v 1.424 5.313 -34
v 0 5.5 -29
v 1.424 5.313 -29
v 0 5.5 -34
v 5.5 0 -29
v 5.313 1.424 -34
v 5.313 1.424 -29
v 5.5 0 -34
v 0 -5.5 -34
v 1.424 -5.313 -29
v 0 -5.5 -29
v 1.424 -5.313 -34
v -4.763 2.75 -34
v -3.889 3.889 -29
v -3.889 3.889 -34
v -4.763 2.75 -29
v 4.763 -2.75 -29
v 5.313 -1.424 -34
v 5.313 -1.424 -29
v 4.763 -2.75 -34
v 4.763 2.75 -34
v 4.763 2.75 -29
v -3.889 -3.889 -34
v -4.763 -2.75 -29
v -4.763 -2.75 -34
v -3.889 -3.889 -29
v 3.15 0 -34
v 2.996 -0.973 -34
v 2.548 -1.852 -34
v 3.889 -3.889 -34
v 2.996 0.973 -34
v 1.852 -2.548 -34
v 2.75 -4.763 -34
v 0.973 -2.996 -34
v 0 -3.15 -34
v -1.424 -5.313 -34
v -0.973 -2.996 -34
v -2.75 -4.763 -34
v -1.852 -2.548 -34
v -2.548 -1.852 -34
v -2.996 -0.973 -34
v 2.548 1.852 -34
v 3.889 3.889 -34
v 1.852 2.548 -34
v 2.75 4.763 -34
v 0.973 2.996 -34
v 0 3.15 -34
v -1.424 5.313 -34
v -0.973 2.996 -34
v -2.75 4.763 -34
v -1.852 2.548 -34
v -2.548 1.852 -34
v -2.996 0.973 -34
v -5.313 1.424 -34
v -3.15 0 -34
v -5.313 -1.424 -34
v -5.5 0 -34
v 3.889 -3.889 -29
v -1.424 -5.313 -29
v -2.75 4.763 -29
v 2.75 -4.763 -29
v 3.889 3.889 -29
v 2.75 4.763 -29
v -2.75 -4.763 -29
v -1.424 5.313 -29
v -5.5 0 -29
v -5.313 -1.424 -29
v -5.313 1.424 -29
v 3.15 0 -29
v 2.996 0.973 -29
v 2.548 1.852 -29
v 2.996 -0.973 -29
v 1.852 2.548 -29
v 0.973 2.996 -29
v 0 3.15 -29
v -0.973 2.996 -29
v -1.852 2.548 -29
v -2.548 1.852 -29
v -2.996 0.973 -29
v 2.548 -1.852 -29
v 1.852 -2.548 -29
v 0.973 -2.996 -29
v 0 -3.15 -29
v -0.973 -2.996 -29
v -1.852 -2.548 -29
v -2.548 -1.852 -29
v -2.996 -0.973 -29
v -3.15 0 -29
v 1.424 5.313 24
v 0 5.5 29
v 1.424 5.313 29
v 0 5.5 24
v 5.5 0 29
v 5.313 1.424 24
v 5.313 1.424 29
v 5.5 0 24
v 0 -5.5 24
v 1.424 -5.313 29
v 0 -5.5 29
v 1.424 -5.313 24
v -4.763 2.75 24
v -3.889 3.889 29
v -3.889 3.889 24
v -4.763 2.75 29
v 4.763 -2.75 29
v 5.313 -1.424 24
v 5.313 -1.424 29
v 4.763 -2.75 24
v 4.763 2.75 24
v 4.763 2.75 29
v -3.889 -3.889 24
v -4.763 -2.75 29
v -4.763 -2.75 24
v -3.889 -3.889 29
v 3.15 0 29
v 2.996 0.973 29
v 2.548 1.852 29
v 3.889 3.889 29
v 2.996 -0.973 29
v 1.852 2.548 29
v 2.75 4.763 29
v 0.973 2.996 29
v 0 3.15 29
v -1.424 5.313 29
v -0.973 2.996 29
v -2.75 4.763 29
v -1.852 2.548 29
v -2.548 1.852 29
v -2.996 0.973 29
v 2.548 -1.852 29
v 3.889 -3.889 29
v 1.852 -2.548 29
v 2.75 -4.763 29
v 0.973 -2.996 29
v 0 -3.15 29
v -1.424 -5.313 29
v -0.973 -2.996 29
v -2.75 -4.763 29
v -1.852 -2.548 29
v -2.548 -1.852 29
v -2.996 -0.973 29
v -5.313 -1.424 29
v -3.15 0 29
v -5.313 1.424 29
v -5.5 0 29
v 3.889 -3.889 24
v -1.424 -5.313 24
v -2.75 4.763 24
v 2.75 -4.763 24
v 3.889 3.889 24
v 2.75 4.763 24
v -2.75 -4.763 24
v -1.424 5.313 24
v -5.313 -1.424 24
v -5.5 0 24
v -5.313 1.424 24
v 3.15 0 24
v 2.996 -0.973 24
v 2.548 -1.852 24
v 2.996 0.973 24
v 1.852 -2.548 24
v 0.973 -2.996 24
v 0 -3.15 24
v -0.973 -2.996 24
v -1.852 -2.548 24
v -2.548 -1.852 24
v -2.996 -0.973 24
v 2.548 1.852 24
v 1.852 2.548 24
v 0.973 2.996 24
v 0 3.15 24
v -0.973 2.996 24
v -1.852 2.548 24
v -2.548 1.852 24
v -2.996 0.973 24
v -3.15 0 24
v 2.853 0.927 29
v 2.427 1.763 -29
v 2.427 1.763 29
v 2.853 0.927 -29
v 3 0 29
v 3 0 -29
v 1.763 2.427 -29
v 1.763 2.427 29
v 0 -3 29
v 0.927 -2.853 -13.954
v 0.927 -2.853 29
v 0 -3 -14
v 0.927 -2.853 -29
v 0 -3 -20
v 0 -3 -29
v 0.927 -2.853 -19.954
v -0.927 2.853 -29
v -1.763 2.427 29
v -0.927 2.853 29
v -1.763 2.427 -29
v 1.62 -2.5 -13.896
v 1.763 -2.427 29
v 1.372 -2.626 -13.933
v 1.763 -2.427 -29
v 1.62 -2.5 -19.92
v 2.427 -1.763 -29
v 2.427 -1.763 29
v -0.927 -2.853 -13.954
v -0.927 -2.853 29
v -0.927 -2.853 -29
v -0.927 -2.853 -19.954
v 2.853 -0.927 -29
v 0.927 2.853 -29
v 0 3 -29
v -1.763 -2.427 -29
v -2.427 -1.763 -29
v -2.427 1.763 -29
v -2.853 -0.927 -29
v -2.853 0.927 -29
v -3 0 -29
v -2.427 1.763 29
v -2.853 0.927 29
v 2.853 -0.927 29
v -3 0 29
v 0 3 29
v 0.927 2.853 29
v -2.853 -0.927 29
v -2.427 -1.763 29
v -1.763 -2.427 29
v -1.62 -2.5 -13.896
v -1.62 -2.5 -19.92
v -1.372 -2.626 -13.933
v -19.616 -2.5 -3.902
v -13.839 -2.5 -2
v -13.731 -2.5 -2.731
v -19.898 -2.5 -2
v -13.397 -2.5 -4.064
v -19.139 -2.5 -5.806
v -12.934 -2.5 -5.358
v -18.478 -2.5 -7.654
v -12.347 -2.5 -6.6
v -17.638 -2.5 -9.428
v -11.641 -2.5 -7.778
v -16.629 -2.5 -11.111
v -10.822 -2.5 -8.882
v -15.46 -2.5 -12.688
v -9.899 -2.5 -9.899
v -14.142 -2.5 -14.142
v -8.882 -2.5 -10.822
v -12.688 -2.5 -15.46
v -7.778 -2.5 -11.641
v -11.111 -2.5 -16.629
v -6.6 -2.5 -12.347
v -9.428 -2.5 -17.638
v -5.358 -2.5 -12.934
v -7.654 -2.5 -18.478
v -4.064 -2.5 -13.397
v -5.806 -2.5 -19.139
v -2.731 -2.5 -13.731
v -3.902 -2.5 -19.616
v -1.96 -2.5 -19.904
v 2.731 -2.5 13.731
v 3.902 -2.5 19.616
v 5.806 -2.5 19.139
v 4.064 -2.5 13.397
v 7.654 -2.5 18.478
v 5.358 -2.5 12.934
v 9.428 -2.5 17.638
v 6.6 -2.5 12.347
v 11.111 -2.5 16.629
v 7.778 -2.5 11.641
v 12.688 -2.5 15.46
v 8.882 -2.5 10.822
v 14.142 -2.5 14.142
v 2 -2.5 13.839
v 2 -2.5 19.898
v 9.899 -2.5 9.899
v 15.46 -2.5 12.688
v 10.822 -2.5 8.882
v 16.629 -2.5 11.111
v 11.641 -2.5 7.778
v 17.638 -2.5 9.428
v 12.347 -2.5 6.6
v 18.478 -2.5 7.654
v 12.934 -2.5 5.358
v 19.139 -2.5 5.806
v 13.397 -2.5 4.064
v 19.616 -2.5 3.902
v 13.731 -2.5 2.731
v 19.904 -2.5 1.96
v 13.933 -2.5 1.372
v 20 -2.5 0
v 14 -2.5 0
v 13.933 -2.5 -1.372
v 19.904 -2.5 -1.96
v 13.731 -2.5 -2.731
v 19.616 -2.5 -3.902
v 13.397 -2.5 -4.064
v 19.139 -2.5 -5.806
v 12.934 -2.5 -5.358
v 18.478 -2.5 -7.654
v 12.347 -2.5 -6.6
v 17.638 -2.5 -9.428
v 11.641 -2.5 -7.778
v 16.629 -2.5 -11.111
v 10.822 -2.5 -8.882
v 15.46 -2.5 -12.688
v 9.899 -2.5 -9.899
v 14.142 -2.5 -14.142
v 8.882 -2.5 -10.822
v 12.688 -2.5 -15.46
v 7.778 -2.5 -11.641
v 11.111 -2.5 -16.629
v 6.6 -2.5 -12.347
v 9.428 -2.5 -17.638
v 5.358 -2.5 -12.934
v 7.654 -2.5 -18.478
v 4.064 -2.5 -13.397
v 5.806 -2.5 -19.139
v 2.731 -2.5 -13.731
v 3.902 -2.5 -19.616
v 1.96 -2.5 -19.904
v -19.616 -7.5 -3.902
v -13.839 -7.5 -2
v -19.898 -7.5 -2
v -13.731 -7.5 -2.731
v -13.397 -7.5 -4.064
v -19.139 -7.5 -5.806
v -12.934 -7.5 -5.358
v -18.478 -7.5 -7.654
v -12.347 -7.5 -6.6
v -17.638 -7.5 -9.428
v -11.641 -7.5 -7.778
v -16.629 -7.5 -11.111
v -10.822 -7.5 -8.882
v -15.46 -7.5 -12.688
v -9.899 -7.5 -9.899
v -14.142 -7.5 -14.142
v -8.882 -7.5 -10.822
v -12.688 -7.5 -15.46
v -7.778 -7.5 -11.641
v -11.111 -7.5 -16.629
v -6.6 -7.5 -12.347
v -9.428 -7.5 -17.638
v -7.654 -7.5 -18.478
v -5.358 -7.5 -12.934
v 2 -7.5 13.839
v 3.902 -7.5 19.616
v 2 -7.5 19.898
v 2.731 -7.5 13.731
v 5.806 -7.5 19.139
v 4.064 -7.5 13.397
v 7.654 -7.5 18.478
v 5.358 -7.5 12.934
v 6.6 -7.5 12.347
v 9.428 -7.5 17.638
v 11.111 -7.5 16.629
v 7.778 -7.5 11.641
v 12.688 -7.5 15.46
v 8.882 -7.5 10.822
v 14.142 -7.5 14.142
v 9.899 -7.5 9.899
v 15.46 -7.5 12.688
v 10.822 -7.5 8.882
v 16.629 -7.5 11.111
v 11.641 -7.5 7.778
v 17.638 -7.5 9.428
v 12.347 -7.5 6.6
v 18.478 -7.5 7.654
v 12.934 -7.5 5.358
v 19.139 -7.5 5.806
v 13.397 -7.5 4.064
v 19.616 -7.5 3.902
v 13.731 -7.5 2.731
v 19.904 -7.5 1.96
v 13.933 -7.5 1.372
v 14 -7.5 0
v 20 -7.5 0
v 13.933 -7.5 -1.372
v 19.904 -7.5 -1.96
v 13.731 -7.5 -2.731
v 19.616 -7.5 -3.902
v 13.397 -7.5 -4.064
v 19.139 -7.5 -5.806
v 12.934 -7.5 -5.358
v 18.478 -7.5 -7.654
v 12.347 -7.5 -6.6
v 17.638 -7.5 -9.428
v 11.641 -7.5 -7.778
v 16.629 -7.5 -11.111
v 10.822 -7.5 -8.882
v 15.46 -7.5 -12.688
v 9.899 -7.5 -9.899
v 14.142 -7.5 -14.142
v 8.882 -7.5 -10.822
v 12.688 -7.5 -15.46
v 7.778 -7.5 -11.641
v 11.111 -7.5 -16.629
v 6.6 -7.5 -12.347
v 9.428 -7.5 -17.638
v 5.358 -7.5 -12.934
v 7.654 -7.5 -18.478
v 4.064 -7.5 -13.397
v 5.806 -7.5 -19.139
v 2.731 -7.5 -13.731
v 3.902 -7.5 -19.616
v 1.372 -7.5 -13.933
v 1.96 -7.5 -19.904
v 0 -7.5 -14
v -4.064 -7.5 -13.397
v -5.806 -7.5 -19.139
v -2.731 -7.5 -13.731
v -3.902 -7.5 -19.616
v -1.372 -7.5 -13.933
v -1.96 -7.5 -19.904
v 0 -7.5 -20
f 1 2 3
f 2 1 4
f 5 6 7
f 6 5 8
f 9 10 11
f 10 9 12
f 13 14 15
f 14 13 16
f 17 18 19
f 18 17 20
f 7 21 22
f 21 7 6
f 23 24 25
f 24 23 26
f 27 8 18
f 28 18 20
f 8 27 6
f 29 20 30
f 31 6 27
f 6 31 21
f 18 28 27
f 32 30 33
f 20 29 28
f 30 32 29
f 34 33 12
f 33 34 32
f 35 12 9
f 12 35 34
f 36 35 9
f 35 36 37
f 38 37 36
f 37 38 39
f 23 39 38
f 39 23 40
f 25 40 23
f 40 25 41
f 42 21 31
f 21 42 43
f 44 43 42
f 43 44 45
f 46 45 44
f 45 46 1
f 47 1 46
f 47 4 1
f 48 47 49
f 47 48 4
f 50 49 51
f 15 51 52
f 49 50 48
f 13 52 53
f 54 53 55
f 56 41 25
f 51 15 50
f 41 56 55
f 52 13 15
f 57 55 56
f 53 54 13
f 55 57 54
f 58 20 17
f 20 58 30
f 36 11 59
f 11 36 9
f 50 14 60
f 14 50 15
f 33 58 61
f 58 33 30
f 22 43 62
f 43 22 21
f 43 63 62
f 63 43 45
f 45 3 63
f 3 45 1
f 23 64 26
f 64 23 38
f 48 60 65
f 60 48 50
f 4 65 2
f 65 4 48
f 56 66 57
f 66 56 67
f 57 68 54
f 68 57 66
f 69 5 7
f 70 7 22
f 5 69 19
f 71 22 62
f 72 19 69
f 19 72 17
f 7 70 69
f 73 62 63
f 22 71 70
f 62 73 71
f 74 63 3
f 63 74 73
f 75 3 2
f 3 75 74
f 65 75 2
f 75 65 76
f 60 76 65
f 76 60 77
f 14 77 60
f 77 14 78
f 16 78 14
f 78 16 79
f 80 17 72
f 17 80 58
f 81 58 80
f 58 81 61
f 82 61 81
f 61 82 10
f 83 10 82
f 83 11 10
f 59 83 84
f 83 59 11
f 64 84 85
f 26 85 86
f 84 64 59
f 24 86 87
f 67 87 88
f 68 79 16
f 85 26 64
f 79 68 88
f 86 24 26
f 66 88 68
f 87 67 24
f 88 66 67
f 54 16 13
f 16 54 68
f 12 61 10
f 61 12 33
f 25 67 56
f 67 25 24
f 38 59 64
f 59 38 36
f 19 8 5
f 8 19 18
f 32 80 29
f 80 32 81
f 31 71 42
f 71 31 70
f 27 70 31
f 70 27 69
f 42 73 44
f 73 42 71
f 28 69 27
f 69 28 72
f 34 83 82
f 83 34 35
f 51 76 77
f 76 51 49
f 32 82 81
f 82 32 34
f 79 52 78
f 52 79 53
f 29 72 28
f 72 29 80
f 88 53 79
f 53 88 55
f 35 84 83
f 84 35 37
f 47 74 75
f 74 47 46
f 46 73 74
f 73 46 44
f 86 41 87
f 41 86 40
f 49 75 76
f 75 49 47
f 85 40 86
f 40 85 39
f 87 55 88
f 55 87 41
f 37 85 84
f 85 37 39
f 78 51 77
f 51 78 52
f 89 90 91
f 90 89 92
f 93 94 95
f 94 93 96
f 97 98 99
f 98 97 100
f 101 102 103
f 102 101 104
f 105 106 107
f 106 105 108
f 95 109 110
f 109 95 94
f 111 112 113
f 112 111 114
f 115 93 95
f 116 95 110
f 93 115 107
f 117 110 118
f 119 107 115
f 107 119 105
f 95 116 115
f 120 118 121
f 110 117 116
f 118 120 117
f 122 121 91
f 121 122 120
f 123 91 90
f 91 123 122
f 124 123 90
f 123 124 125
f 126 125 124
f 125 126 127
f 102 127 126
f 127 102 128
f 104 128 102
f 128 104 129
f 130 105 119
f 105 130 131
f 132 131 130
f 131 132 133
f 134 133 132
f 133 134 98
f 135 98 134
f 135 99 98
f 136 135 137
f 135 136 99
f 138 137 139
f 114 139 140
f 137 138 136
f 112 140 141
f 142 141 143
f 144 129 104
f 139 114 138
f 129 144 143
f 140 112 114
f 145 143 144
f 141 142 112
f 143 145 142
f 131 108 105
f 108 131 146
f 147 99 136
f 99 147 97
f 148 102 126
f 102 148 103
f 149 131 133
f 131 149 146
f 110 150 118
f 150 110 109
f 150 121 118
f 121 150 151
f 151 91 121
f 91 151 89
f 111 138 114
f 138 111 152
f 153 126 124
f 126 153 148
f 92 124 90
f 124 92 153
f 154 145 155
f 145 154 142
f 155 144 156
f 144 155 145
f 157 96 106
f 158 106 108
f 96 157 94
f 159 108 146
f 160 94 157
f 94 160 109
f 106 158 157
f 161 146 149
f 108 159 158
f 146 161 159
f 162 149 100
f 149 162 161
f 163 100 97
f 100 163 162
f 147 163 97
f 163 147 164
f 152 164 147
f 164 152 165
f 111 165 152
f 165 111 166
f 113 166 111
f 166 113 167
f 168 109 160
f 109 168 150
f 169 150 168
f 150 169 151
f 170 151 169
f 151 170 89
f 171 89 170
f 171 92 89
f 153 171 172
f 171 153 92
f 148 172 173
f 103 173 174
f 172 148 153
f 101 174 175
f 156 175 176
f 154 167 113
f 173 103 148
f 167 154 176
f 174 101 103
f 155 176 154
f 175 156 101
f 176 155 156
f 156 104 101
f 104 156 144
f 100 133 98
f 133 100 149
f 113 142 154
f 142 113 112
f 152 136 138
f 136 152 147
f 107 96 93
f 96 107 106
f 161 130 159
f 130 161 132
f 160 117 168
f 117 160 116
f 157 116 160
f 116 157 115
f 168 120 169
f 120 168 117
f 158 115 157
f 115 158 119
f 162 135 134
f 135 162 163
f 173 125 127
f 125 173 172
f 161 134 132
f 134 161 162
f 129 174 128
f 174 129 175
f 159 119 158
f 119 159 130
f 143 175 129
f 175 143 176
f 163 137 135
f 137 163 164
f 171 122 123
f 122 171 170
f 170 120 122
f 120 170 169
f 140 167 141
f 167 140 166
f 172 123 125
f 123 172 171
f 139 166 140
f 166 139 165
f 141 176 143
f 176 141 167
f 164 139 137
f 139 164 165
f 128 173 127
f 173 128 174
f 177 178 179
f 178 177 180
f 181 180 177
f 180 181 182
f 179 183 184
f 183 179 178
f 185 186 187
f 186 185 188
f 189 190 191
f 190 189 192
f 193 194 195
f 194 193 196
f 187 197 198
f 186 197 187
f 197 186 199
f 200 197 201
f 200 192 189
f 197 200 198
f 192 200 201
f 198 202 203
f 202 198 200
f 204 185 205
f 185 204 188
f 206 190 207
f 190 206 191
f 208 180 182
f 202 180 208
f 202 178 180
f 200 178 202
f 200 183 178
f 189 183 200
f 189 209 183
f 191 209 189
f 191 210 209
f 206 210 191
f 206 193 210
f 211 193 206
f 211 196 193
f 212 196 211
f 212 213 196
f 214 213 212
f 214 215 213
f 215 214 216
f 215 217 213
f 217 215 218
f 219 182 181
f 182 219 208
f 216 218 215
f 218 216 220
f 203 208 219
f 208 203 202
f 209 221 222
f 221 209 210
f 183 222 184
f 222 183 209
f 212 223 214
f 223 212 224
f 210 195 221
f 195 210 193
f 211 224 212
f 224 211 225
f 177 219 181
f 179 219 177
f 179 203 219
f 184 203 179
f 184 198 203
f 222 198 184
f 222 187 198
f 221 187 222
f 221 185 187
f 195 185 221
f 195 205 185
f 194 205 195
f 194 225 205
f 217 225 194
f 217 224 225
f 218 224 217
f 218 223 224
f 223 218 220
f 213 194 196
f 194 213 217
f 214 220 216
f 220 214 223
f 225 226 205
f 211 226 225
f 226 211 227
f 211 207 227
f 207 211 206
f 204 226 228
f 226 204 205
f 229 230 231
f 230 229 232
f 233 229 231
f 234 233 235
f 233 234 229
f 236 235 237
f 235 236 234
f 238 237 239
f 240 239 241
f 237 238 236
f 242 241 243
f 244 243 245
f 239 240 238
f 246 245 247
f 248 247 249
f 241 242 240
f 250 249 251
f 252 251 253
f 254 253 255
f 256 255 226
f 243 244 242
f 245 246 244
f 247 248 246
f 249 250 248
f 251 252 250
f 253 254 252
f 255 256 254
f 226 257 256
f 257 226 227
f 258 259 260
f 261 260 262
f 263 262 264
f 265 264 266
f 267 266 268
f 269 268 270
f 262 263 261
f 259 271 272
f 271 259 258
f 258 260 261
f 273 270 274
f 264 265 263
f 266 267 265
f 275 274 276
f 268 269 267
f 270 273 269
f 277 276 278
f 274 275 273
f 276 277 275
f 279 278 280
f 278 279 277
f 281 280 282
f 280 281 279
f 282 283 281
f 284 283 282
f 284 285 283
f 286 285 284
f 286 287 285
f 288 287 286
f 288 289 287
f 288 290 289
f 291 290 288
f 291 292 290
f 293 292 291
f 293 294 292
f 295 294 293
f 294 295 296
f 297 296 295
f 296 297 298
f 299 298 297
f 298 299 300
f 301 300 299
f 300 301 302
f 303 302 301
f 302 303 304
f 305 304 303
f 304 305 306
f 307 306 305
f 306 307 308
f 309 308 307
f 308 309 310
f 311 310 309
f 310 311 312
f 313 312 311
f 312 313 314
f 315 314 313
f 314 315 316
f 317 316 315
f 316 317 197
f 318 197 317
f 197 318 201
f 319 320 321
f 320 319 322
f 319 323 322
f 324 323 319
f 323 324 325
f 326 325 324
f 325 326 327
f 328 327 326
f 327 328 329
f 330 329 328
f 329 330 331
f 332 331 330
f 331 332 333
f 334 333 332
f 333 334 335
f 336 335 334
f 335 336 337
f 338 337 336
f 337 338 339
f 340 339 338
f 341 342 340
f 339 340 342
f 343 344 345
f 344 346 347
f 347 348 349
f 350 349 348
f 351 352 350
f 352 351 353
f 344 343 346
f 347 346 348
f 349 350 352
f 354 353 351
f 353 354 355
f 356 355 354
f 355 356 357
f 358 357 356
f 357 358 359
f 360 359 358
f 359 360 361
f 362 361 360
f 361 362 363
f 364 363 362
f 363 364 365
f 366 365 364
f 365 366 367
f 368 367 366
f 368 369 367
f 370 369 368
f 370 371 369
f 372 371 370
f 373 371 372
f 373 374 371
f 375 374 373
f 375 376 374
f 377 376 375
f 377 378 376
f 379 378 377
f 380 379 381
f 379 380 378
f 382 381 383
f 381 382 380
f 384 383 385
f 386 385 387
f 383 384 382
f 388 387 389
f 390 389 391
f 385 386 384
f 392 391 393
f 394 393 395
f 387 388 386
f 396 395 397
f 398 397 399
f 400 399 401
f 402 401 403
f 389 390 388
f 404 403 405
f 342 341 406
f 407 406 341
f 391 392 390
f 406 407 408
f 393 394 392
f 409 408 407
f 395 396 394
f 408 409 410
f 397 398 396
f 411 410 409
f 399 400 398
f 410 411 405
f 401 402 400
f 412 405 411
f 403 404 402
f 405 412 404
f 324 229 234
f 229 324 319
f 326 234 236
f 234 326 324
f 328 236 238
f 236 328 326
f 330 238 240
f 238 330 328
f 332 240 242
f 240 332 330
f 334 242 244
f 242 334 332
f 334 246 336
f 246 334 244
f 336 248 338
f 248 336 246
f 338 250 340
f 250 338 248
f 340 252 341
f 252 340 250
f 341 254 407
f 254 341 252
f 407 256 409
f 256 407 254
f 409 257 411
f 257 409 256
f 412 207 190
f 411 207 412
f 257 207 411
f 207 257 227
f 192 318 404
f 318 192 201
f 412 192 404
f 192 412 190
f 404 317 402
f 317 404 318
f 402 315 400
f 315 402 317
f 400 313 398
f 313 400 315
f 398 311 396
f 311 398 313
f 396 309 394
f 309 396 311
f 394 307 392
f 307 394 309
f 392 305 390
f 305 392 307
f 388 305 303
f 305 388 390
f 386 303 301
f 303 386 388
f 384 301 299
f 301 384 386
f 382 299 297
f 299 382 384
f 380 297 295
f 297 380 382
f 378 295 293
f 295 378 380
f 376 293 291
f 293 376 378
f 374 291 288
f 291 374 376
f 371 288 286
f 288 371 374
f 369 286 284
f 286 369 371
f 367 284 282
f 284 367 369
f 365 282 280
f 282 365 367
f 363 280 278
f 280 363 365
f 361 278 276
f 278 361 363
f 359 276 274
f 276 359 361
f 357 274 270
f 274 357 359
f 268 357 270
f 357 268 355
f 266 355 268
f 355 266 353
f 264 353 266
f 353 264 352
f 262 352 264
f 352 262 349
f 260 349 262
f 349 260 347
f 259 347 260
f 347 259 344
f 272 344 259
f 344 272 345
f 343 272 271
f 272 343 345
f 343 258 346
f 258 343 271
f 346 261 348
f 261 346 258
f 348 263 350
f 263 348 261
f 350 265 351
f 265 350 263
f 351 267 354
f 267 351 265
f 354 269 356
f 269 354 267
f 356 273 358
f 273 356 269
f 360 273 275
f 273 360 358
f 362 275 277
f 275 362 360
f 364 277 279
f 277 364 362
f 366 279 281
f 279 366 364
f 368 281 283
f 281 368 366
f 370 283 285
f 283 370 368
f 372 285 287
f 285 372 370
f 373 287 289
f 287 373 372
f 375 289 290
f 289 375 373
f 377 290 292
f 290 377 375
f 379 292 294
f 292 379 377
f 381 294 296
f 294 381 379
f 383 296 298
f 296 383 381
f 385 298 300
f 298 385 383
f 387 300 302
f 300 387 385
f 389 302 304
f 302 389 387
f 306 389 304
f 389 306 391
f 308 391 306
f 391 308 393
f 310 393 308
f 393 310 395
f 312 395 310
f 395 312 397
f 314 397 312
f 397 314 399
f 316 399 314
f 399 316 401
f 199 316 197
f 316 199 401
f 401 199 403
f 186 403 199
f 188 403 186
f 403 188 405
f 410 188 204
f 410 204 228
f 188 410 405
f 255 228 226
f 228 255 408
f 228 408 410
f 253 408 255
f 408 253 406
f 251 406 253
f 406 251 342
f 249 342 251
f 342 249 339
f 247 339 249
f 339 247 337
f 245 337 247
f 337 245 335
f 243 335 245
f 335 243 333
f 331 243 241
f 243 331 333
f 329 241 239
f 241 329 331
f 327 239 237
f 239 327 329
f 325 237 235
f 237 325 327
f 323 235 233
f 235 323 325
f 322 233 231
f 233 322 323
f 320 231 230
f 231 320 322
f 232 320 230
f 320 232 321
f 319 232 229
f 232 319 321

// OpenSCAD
// file: _constants.scad
// =============================================================================
// GymRollerBag — Shared Constants & Modules
// =============================================================================
// All dimensional constants in millimeters (mm).
// All component files must: include <_constants.scad>
//
// Rendering tip: Change $fn to 32 for fast development previews,
// set to 128 for final STL export.
// =============================================================================

// --- Dimensional Constants ---
OUTER_DIAMETER  = 152;    // EVA foam shell outer diameter (6 inches)
INNER_DIAMETER  = 127;    // Inner storage cavity diameter (5 inches)
WALL_THICKNESS  = 12.7;   // Foam wall thickness (0.5 inches)
BODY_LENGTH     = 457;    // Roller body length (18 inches)
CAP_HEIGHT      = 25;     // Depth of each end cap
CAP_PLUG_EXTRA  = 8;      // How far the cap plug extends into the body
THREAD_PITCH    = 3;      // Helical thread pitch for removable cap
THREAD_DEPTH    = 1.5;    // Thread profile depth (radial)
GROOVE_DEPTH    = 3;      // Surface texture groove depth
GROOVE_WIDTH    = 5;      // Surface texture groove width
GROOVE_SPACING  = 20;     // Axial distance between grooves
D_RING_WIDTH    = 38;     // D-ring inner width (matches 38mm webbing)
BOSS_DIAMETER   = 20;     // Strap boss outer diameter
BOSS_HEIGHT     = 10;     // Strap boss height above cap face
BOSS_HOLE_DIA   = 7;      // Through-hole for D-ring bar
FIT_TOLERANCE   = 0.4;    // Press-fit clearance (subtract from plug OD)

// --- Render Quality ---
// Comment out one line depending on mode:
$fn = 32;   // Development (fast preview)
// $fn = 128;  // Production (smooth STL export)

// =============================================================================
// Shared Module: strap_boss()
// A raised cylindrical boss on a cap face with a horizontal bar hole
// for threading the D-ring cross-bar through.
// Centered at [0,0,0] — caller must translate to correct position.
// =============================================================================
module strap_boss() {
    difference() {
        // Boss cylinder
        cylinder(h=BOSS_HEIGHT, d=BOSS_DIAMETER, $fn=32);

        // Horizontal through-hole for D-ring bar
        translate([0, -(BOSS_DIAMETER), BOSS_HEIGHT / 2])
            rotate([-90, 0, 0])
                cylinder(h=BOSS_DIAMETER * 2, d=BOSS_HOLE_DIA, $fn=24);
    }
}

// =============================================================================
// Shared Module: thread_helix(diameter, pitch, length, external)
// Generates a helical thread profile using twisted extrusion.
// external=true  → external thread (used on roller body end)
// external=false → internal thread (used inside removable cap plug)
// =============================================================================
module thread_helix(diameter, pitch, length, external=true) {
    turns = length / pitch;
    total_angle = turns * 360;
    r = diameter / 2;

    // Triangle tooth profile
    tooth_h = THREAD_DEPTH;
    tooth_w = pitch * 0.6;

    sign = external ? 1 : -1;

    linear_extrude(
        height    = length,
        twist     = -total_angle,
        slices    = turns * 24,
        $fn       = 48
    )
    // Thread tooth positioned at the thread radius
    translate([r + sign * (tooth_h / 2), 0, 0])
        polygon([
            [-tooth_h / 2, -tooth_w / 2],
            [ tooth_h / 2,  0           ],
            [-tooth_h / 2,  tooth_w / 2 ]
        ]);
}
// main file
// =============================================================================
// GymRollerBag — Strap Mount (D-Ring Hardware)
// =============================================================================
// The D-ring attachment assembly that threads through the boss hole on
// each end cap, anchoring the backpack strap webbing.
//
// Assembly:
//   1. Thread cross-bar through the boss hole on the end cap
//   2. Press retention collars onto each end of bar
//   3. Loop 38mm nylon webbing through the D-ring
//   4. Connect webbing to adjustable shoulder strap buckles
//
// Print settings: ABS (high temperature resistance near gym equipment),
// 50% infill, 4 perimeters — this component takes the highest load.
//
// Hardware spec: Can also be manufactured in anodized aluminum (recommended
// for production units). The 3D-printed version is for prototyping/fitting.
// =============================================================================

include <_constants.scad>

STANDALONE = true;

// Bar total length: webbing width + collar space on each side
BAR_LENGTH   = D_RING_WIDTH + 20;   // 58mm total
BAR_DIAMETER = 6;
COLLAR_DIA   = 11;
COLLAR_H     = 5;
D_RING_R_OUT = 20;   // outer radius of D-ring frame
D_RING_R_IN  = 14;   // inner radius — must pass 38mm webbing through flat side
D_RING_THICK = 5;    // extrusion thickness of D-ring

// --- Retention Collar ---
// Press-fit onto each end of the cross-bar to prevent it pulling
// through the boss hole. Snap-fit or adhesive bonded in production.
module retention_collar() {
    difference() {
        cylinder(h=COLLAR_H, d=COLLAR_DIA, $fn=24);
        translate([0, 0, -1])
            cylinder(h=COLLAR_H + 2, d=BAR_DIAMETER + 0.3, $fn=20);
    }
}

// --- D-Ring Frame ---
// A D-shaped ring: a partial annulus with a flat chord on one side.
// The flat side is against the end cap; webbing loops through the open arc.
// Inner clearance must accommodate 38mm wide × ~5mm thick webbing.
module d_ring_frame() {
    linear_extrude(height=D_RING_THICK, convexity=4)
    difference() {
        // Outer circle of D
        circle(r=D_RING_R_OUT, $fn=64);
        // Inner void
        circle(r=D_RING_R_IN, $fn=64);
        // Flat chord cut — removes left half to form the D shape
        // The flat back aligns with the roller axis
        translate([-D_RING_R_OUT - 1, -D_RING_R_OUT - 1, 0])
            square(D_RING_R_OUT + 1 + 2, D_RING_R_OUT * 2 + 2);
    }
}

// --- Full Strap Mount Assembly ---
module strap_mount() {
    // Cross-bar (runs through boss hole perpendicular to roller axis)
    cylinder(h=BAR_LENGTH, d=BAR_DIAMETER, center=true, $fn=20);

    // Retention collar — left end
    translate([0, 0, -(BAR_LENGTH / 2)])
        mirror([0, 0, 1])
            retention_collar();

    // Retention collar — right end
    translate([0, 0, BAR_LENGTH / 2 - COLLAR_H])
        retention_collar();

    // D-ring attached at center of bar, perpendicular (arc faces outward)
    translate([0, 0, 0])
        rotate([0, 90, 0])
            translate([0, -D_RING_THICK / 2, 0])
                rotate([90, 0, 0])
                    d_ring_frame();
}

if (STANDALONE) strap_mount();
